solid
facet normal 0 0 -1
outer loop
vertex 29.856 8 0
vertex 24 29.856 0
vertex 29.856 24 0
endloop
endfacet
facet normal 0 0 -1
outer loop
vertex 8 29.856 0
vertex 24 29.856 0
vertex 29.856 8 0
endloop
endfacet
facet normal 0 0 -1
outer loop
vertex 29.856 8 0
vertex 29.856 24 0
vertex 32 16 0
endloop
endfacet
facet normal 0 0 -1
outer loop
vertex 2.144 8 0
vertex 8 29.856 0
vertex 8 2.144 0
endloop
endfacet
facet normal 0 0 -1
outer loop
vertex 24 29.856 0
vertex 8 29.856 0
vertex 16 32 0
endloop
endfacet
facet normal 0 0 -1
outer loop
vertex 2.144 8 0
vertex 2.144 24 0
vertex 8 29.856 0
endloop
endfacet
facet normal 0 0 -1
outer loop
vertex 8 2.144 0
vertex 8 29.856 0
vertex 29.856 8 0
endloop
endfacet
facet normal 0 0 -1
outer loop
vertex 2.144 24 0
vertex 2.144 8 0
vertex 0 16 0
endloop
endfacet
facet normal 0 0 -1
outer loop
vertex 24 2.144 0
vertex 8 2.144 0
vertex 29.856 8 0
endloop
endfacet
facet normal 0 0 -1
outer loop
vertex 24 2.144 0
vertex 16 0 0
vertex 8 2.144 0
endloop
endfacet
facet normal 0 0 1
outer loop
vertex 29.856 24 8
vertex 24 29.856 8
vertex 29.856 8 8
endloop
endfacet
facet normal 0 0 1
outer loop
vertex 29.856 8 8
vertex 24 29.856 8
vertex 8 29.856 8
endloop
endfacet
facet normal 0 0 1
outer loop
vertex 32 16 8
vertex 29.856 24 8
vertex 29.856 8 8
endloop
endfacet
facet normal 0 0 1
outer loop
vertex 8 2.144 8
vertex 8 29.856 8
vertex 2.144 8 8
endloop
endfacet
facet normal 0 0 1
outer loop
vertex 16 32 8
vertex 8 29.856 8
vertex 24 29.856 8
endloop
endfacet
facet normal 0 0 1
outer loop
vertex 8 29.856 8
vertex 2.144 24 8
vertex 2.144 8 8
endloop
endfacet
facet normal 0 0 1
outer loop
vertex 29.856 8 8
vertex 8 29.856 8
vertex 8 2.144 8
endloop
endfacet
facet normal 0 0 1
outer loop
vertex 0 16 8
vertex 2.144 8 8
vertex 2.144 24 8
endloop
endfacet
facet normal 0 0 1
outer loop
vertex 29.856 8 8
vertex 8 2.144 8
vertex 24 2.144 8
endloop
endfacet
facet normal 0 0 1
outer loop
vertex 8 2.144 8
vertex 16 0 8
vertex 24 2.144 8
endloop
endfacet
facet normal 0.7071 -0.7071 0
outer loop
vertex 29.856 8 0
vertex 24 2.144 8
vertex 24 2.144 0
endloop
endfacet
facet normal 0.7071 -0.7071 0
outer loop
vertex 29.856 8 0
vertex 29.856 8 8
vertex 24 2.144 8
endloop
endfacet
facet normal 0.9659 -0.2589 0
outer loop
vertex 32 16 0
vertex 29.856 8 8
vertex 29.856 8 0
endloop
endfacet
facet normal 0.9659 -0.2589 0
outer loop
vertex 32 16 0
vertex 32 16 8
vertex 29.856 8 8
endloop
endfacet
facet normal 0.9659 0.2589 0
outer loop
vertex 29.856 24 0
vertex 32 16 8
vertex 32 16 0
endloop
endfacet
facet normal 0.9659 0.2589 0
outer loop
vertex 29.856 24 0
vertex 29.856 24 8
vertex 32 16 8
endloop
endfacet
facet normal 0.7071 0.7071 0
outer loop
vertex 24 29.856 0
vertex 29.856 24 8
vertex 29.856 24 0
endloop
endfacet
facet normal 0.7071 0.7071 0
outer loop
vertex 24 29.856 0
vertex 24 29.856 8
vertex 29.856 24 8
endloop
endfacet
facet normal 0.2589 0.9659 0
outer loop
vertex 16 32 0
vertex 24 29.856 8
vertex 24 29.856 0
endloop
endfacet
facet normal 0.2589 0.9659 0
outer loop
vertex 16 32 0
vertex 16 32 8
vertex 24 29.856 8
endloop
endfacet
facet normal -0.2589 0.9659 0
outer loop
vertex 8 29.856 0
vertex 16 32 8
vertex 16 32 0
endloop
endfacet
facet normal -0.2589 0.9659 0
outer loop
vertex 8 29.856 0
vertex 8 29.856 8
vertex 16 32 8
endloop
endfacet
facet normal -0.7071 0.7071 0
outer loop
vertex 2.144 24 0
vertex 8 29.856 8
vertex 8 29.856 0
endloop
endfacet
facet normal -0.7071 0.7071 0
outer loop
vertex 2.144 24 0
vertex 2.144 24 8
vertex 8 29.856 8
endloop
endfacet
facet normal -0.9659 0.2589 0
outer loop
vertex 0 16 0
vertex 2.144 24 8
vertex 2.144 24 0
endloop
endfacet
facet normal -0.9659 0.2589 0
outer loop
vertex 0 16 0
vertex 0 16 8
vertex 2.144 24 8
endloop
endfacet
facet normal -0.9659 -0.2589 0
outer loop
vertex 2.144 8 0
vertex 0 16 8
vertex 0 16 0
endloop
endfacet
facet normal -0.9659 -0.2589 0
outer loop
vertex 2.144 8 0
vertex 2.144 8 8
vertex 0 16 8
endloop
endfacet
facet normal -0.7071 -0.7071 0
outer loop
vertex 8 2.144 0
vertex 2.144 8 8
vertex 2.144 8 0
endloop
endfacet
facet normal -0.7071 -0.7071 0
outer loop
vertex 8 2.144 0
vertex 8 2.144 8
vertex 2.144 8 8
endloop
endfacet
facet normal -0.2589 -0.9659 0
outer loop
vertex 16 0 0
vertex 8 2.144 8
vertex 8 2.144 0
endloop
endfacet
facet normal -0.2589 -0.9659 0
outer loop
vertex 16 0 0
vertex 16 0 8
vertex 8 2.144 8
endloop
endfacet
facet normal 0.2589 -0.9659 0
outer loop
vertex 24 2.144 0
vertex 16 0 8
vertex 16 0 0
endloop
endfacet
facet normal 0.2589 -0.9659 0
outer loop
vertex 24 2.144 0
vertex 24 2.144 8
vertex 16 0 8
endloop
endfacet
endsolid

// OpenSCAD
$fn = 32;

// ----------------------------------------------------------------------
// Eccentric disc: egg, 8 mm thick
// ----------------------------------------------------------------------

// --- parameters (mm) ---
profile_height = 8;       // extrusion height
profile_points = 12;      // points of the closed outline

profile = [[0, 16], [2.144, 8], [8, 2.144], [16, 0], [24, 2.144], [29.856, 8], [32, 16], [29.856, 24], [24, 29.856], [16, 32], [8, 29.856], [2.144, 24]];  // single closed polygon, 12 points, counter clockwise

// --- the one profile operation ---
linear_extrude(height = profile_height) polygon(points = profile);
